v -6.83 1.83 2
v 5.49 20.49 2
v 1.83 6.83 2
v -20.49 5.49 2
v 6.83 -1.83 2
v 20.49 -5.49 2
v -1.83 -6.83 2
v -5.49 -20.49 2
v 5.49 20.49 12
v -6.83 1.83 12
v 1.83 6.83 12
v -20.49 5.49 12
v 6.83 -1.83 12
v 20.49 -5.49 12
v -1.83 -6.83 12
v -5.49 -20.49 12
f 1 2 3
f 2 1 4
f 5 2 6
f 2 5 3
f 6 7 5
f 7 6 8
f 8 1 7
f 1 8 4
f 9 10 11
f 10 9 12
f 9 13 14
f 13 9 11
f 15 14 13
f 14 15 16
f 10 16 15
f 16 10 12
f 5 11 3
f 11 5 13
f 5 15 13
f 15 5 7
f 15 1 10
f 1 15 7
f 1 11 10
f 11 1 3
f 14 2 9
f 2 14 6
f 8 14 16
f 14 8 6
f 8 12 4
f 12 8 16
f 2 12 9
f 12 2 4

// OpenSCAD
translate([0,0,2]) union() {
    rotate([0,0,30])
    translate([-15,-15,0]) {
        scale(10) {
            polyhedron(
                //         1------------------0
                //        /|                 /|
                //       / |    9----8      / |
                //      /  5-- /|   /| ----/--4
                //     /  /  11----10|    /  /
                //    /  /    |13--|-12  /  /
                //   3------  |/   |/ --2  /
                //   | /     15----14   | /
                //   |/                 |/
                //   7------------------6
                points=[
                    [3,3,1],
                    [0,3,1],
                    [3,0,1],
                    [0,0,1],
                    [3,3,0],
                    [0,3,0],
                    [3,0,0],
                    [0,0,0],

                    [2,2,1],
                    [1,2,1],
                    [2,1,1],
                    [1,1,1],
                    [2,2,0],
                    [1,2,0],
                    [2,1,0],
                    [1,1,0],
                ],
                faces=[
                    [  4,  5, 13, 12 ],
                    [  4, 12, 14,  6 ],
                    [  6, 14, 15,  7 ],
                    [  7, 15, 13,  5 ],

                    [  1,  0,  8,  9 ],
                    [  0,  2, 10,  8 ],
                    [  2,  3, 11, 10 ],
                    [  3,  1,  9, 11 ],

                    [  8, 10, 14, 12 ],
                    [ 10, 11, 15, 14 ],
                    [ 11,  9, 13, 15 ],
                    [  9,  8, 12, 13 ],

                    [  0,  4,  6,  2 ],
                    [  2,  6,  7,  3 ],
                    [  3,  7,  5,  1 ],
                    [  1,  5,  4,  0 ],
                ]
            );
        };
    }
}
